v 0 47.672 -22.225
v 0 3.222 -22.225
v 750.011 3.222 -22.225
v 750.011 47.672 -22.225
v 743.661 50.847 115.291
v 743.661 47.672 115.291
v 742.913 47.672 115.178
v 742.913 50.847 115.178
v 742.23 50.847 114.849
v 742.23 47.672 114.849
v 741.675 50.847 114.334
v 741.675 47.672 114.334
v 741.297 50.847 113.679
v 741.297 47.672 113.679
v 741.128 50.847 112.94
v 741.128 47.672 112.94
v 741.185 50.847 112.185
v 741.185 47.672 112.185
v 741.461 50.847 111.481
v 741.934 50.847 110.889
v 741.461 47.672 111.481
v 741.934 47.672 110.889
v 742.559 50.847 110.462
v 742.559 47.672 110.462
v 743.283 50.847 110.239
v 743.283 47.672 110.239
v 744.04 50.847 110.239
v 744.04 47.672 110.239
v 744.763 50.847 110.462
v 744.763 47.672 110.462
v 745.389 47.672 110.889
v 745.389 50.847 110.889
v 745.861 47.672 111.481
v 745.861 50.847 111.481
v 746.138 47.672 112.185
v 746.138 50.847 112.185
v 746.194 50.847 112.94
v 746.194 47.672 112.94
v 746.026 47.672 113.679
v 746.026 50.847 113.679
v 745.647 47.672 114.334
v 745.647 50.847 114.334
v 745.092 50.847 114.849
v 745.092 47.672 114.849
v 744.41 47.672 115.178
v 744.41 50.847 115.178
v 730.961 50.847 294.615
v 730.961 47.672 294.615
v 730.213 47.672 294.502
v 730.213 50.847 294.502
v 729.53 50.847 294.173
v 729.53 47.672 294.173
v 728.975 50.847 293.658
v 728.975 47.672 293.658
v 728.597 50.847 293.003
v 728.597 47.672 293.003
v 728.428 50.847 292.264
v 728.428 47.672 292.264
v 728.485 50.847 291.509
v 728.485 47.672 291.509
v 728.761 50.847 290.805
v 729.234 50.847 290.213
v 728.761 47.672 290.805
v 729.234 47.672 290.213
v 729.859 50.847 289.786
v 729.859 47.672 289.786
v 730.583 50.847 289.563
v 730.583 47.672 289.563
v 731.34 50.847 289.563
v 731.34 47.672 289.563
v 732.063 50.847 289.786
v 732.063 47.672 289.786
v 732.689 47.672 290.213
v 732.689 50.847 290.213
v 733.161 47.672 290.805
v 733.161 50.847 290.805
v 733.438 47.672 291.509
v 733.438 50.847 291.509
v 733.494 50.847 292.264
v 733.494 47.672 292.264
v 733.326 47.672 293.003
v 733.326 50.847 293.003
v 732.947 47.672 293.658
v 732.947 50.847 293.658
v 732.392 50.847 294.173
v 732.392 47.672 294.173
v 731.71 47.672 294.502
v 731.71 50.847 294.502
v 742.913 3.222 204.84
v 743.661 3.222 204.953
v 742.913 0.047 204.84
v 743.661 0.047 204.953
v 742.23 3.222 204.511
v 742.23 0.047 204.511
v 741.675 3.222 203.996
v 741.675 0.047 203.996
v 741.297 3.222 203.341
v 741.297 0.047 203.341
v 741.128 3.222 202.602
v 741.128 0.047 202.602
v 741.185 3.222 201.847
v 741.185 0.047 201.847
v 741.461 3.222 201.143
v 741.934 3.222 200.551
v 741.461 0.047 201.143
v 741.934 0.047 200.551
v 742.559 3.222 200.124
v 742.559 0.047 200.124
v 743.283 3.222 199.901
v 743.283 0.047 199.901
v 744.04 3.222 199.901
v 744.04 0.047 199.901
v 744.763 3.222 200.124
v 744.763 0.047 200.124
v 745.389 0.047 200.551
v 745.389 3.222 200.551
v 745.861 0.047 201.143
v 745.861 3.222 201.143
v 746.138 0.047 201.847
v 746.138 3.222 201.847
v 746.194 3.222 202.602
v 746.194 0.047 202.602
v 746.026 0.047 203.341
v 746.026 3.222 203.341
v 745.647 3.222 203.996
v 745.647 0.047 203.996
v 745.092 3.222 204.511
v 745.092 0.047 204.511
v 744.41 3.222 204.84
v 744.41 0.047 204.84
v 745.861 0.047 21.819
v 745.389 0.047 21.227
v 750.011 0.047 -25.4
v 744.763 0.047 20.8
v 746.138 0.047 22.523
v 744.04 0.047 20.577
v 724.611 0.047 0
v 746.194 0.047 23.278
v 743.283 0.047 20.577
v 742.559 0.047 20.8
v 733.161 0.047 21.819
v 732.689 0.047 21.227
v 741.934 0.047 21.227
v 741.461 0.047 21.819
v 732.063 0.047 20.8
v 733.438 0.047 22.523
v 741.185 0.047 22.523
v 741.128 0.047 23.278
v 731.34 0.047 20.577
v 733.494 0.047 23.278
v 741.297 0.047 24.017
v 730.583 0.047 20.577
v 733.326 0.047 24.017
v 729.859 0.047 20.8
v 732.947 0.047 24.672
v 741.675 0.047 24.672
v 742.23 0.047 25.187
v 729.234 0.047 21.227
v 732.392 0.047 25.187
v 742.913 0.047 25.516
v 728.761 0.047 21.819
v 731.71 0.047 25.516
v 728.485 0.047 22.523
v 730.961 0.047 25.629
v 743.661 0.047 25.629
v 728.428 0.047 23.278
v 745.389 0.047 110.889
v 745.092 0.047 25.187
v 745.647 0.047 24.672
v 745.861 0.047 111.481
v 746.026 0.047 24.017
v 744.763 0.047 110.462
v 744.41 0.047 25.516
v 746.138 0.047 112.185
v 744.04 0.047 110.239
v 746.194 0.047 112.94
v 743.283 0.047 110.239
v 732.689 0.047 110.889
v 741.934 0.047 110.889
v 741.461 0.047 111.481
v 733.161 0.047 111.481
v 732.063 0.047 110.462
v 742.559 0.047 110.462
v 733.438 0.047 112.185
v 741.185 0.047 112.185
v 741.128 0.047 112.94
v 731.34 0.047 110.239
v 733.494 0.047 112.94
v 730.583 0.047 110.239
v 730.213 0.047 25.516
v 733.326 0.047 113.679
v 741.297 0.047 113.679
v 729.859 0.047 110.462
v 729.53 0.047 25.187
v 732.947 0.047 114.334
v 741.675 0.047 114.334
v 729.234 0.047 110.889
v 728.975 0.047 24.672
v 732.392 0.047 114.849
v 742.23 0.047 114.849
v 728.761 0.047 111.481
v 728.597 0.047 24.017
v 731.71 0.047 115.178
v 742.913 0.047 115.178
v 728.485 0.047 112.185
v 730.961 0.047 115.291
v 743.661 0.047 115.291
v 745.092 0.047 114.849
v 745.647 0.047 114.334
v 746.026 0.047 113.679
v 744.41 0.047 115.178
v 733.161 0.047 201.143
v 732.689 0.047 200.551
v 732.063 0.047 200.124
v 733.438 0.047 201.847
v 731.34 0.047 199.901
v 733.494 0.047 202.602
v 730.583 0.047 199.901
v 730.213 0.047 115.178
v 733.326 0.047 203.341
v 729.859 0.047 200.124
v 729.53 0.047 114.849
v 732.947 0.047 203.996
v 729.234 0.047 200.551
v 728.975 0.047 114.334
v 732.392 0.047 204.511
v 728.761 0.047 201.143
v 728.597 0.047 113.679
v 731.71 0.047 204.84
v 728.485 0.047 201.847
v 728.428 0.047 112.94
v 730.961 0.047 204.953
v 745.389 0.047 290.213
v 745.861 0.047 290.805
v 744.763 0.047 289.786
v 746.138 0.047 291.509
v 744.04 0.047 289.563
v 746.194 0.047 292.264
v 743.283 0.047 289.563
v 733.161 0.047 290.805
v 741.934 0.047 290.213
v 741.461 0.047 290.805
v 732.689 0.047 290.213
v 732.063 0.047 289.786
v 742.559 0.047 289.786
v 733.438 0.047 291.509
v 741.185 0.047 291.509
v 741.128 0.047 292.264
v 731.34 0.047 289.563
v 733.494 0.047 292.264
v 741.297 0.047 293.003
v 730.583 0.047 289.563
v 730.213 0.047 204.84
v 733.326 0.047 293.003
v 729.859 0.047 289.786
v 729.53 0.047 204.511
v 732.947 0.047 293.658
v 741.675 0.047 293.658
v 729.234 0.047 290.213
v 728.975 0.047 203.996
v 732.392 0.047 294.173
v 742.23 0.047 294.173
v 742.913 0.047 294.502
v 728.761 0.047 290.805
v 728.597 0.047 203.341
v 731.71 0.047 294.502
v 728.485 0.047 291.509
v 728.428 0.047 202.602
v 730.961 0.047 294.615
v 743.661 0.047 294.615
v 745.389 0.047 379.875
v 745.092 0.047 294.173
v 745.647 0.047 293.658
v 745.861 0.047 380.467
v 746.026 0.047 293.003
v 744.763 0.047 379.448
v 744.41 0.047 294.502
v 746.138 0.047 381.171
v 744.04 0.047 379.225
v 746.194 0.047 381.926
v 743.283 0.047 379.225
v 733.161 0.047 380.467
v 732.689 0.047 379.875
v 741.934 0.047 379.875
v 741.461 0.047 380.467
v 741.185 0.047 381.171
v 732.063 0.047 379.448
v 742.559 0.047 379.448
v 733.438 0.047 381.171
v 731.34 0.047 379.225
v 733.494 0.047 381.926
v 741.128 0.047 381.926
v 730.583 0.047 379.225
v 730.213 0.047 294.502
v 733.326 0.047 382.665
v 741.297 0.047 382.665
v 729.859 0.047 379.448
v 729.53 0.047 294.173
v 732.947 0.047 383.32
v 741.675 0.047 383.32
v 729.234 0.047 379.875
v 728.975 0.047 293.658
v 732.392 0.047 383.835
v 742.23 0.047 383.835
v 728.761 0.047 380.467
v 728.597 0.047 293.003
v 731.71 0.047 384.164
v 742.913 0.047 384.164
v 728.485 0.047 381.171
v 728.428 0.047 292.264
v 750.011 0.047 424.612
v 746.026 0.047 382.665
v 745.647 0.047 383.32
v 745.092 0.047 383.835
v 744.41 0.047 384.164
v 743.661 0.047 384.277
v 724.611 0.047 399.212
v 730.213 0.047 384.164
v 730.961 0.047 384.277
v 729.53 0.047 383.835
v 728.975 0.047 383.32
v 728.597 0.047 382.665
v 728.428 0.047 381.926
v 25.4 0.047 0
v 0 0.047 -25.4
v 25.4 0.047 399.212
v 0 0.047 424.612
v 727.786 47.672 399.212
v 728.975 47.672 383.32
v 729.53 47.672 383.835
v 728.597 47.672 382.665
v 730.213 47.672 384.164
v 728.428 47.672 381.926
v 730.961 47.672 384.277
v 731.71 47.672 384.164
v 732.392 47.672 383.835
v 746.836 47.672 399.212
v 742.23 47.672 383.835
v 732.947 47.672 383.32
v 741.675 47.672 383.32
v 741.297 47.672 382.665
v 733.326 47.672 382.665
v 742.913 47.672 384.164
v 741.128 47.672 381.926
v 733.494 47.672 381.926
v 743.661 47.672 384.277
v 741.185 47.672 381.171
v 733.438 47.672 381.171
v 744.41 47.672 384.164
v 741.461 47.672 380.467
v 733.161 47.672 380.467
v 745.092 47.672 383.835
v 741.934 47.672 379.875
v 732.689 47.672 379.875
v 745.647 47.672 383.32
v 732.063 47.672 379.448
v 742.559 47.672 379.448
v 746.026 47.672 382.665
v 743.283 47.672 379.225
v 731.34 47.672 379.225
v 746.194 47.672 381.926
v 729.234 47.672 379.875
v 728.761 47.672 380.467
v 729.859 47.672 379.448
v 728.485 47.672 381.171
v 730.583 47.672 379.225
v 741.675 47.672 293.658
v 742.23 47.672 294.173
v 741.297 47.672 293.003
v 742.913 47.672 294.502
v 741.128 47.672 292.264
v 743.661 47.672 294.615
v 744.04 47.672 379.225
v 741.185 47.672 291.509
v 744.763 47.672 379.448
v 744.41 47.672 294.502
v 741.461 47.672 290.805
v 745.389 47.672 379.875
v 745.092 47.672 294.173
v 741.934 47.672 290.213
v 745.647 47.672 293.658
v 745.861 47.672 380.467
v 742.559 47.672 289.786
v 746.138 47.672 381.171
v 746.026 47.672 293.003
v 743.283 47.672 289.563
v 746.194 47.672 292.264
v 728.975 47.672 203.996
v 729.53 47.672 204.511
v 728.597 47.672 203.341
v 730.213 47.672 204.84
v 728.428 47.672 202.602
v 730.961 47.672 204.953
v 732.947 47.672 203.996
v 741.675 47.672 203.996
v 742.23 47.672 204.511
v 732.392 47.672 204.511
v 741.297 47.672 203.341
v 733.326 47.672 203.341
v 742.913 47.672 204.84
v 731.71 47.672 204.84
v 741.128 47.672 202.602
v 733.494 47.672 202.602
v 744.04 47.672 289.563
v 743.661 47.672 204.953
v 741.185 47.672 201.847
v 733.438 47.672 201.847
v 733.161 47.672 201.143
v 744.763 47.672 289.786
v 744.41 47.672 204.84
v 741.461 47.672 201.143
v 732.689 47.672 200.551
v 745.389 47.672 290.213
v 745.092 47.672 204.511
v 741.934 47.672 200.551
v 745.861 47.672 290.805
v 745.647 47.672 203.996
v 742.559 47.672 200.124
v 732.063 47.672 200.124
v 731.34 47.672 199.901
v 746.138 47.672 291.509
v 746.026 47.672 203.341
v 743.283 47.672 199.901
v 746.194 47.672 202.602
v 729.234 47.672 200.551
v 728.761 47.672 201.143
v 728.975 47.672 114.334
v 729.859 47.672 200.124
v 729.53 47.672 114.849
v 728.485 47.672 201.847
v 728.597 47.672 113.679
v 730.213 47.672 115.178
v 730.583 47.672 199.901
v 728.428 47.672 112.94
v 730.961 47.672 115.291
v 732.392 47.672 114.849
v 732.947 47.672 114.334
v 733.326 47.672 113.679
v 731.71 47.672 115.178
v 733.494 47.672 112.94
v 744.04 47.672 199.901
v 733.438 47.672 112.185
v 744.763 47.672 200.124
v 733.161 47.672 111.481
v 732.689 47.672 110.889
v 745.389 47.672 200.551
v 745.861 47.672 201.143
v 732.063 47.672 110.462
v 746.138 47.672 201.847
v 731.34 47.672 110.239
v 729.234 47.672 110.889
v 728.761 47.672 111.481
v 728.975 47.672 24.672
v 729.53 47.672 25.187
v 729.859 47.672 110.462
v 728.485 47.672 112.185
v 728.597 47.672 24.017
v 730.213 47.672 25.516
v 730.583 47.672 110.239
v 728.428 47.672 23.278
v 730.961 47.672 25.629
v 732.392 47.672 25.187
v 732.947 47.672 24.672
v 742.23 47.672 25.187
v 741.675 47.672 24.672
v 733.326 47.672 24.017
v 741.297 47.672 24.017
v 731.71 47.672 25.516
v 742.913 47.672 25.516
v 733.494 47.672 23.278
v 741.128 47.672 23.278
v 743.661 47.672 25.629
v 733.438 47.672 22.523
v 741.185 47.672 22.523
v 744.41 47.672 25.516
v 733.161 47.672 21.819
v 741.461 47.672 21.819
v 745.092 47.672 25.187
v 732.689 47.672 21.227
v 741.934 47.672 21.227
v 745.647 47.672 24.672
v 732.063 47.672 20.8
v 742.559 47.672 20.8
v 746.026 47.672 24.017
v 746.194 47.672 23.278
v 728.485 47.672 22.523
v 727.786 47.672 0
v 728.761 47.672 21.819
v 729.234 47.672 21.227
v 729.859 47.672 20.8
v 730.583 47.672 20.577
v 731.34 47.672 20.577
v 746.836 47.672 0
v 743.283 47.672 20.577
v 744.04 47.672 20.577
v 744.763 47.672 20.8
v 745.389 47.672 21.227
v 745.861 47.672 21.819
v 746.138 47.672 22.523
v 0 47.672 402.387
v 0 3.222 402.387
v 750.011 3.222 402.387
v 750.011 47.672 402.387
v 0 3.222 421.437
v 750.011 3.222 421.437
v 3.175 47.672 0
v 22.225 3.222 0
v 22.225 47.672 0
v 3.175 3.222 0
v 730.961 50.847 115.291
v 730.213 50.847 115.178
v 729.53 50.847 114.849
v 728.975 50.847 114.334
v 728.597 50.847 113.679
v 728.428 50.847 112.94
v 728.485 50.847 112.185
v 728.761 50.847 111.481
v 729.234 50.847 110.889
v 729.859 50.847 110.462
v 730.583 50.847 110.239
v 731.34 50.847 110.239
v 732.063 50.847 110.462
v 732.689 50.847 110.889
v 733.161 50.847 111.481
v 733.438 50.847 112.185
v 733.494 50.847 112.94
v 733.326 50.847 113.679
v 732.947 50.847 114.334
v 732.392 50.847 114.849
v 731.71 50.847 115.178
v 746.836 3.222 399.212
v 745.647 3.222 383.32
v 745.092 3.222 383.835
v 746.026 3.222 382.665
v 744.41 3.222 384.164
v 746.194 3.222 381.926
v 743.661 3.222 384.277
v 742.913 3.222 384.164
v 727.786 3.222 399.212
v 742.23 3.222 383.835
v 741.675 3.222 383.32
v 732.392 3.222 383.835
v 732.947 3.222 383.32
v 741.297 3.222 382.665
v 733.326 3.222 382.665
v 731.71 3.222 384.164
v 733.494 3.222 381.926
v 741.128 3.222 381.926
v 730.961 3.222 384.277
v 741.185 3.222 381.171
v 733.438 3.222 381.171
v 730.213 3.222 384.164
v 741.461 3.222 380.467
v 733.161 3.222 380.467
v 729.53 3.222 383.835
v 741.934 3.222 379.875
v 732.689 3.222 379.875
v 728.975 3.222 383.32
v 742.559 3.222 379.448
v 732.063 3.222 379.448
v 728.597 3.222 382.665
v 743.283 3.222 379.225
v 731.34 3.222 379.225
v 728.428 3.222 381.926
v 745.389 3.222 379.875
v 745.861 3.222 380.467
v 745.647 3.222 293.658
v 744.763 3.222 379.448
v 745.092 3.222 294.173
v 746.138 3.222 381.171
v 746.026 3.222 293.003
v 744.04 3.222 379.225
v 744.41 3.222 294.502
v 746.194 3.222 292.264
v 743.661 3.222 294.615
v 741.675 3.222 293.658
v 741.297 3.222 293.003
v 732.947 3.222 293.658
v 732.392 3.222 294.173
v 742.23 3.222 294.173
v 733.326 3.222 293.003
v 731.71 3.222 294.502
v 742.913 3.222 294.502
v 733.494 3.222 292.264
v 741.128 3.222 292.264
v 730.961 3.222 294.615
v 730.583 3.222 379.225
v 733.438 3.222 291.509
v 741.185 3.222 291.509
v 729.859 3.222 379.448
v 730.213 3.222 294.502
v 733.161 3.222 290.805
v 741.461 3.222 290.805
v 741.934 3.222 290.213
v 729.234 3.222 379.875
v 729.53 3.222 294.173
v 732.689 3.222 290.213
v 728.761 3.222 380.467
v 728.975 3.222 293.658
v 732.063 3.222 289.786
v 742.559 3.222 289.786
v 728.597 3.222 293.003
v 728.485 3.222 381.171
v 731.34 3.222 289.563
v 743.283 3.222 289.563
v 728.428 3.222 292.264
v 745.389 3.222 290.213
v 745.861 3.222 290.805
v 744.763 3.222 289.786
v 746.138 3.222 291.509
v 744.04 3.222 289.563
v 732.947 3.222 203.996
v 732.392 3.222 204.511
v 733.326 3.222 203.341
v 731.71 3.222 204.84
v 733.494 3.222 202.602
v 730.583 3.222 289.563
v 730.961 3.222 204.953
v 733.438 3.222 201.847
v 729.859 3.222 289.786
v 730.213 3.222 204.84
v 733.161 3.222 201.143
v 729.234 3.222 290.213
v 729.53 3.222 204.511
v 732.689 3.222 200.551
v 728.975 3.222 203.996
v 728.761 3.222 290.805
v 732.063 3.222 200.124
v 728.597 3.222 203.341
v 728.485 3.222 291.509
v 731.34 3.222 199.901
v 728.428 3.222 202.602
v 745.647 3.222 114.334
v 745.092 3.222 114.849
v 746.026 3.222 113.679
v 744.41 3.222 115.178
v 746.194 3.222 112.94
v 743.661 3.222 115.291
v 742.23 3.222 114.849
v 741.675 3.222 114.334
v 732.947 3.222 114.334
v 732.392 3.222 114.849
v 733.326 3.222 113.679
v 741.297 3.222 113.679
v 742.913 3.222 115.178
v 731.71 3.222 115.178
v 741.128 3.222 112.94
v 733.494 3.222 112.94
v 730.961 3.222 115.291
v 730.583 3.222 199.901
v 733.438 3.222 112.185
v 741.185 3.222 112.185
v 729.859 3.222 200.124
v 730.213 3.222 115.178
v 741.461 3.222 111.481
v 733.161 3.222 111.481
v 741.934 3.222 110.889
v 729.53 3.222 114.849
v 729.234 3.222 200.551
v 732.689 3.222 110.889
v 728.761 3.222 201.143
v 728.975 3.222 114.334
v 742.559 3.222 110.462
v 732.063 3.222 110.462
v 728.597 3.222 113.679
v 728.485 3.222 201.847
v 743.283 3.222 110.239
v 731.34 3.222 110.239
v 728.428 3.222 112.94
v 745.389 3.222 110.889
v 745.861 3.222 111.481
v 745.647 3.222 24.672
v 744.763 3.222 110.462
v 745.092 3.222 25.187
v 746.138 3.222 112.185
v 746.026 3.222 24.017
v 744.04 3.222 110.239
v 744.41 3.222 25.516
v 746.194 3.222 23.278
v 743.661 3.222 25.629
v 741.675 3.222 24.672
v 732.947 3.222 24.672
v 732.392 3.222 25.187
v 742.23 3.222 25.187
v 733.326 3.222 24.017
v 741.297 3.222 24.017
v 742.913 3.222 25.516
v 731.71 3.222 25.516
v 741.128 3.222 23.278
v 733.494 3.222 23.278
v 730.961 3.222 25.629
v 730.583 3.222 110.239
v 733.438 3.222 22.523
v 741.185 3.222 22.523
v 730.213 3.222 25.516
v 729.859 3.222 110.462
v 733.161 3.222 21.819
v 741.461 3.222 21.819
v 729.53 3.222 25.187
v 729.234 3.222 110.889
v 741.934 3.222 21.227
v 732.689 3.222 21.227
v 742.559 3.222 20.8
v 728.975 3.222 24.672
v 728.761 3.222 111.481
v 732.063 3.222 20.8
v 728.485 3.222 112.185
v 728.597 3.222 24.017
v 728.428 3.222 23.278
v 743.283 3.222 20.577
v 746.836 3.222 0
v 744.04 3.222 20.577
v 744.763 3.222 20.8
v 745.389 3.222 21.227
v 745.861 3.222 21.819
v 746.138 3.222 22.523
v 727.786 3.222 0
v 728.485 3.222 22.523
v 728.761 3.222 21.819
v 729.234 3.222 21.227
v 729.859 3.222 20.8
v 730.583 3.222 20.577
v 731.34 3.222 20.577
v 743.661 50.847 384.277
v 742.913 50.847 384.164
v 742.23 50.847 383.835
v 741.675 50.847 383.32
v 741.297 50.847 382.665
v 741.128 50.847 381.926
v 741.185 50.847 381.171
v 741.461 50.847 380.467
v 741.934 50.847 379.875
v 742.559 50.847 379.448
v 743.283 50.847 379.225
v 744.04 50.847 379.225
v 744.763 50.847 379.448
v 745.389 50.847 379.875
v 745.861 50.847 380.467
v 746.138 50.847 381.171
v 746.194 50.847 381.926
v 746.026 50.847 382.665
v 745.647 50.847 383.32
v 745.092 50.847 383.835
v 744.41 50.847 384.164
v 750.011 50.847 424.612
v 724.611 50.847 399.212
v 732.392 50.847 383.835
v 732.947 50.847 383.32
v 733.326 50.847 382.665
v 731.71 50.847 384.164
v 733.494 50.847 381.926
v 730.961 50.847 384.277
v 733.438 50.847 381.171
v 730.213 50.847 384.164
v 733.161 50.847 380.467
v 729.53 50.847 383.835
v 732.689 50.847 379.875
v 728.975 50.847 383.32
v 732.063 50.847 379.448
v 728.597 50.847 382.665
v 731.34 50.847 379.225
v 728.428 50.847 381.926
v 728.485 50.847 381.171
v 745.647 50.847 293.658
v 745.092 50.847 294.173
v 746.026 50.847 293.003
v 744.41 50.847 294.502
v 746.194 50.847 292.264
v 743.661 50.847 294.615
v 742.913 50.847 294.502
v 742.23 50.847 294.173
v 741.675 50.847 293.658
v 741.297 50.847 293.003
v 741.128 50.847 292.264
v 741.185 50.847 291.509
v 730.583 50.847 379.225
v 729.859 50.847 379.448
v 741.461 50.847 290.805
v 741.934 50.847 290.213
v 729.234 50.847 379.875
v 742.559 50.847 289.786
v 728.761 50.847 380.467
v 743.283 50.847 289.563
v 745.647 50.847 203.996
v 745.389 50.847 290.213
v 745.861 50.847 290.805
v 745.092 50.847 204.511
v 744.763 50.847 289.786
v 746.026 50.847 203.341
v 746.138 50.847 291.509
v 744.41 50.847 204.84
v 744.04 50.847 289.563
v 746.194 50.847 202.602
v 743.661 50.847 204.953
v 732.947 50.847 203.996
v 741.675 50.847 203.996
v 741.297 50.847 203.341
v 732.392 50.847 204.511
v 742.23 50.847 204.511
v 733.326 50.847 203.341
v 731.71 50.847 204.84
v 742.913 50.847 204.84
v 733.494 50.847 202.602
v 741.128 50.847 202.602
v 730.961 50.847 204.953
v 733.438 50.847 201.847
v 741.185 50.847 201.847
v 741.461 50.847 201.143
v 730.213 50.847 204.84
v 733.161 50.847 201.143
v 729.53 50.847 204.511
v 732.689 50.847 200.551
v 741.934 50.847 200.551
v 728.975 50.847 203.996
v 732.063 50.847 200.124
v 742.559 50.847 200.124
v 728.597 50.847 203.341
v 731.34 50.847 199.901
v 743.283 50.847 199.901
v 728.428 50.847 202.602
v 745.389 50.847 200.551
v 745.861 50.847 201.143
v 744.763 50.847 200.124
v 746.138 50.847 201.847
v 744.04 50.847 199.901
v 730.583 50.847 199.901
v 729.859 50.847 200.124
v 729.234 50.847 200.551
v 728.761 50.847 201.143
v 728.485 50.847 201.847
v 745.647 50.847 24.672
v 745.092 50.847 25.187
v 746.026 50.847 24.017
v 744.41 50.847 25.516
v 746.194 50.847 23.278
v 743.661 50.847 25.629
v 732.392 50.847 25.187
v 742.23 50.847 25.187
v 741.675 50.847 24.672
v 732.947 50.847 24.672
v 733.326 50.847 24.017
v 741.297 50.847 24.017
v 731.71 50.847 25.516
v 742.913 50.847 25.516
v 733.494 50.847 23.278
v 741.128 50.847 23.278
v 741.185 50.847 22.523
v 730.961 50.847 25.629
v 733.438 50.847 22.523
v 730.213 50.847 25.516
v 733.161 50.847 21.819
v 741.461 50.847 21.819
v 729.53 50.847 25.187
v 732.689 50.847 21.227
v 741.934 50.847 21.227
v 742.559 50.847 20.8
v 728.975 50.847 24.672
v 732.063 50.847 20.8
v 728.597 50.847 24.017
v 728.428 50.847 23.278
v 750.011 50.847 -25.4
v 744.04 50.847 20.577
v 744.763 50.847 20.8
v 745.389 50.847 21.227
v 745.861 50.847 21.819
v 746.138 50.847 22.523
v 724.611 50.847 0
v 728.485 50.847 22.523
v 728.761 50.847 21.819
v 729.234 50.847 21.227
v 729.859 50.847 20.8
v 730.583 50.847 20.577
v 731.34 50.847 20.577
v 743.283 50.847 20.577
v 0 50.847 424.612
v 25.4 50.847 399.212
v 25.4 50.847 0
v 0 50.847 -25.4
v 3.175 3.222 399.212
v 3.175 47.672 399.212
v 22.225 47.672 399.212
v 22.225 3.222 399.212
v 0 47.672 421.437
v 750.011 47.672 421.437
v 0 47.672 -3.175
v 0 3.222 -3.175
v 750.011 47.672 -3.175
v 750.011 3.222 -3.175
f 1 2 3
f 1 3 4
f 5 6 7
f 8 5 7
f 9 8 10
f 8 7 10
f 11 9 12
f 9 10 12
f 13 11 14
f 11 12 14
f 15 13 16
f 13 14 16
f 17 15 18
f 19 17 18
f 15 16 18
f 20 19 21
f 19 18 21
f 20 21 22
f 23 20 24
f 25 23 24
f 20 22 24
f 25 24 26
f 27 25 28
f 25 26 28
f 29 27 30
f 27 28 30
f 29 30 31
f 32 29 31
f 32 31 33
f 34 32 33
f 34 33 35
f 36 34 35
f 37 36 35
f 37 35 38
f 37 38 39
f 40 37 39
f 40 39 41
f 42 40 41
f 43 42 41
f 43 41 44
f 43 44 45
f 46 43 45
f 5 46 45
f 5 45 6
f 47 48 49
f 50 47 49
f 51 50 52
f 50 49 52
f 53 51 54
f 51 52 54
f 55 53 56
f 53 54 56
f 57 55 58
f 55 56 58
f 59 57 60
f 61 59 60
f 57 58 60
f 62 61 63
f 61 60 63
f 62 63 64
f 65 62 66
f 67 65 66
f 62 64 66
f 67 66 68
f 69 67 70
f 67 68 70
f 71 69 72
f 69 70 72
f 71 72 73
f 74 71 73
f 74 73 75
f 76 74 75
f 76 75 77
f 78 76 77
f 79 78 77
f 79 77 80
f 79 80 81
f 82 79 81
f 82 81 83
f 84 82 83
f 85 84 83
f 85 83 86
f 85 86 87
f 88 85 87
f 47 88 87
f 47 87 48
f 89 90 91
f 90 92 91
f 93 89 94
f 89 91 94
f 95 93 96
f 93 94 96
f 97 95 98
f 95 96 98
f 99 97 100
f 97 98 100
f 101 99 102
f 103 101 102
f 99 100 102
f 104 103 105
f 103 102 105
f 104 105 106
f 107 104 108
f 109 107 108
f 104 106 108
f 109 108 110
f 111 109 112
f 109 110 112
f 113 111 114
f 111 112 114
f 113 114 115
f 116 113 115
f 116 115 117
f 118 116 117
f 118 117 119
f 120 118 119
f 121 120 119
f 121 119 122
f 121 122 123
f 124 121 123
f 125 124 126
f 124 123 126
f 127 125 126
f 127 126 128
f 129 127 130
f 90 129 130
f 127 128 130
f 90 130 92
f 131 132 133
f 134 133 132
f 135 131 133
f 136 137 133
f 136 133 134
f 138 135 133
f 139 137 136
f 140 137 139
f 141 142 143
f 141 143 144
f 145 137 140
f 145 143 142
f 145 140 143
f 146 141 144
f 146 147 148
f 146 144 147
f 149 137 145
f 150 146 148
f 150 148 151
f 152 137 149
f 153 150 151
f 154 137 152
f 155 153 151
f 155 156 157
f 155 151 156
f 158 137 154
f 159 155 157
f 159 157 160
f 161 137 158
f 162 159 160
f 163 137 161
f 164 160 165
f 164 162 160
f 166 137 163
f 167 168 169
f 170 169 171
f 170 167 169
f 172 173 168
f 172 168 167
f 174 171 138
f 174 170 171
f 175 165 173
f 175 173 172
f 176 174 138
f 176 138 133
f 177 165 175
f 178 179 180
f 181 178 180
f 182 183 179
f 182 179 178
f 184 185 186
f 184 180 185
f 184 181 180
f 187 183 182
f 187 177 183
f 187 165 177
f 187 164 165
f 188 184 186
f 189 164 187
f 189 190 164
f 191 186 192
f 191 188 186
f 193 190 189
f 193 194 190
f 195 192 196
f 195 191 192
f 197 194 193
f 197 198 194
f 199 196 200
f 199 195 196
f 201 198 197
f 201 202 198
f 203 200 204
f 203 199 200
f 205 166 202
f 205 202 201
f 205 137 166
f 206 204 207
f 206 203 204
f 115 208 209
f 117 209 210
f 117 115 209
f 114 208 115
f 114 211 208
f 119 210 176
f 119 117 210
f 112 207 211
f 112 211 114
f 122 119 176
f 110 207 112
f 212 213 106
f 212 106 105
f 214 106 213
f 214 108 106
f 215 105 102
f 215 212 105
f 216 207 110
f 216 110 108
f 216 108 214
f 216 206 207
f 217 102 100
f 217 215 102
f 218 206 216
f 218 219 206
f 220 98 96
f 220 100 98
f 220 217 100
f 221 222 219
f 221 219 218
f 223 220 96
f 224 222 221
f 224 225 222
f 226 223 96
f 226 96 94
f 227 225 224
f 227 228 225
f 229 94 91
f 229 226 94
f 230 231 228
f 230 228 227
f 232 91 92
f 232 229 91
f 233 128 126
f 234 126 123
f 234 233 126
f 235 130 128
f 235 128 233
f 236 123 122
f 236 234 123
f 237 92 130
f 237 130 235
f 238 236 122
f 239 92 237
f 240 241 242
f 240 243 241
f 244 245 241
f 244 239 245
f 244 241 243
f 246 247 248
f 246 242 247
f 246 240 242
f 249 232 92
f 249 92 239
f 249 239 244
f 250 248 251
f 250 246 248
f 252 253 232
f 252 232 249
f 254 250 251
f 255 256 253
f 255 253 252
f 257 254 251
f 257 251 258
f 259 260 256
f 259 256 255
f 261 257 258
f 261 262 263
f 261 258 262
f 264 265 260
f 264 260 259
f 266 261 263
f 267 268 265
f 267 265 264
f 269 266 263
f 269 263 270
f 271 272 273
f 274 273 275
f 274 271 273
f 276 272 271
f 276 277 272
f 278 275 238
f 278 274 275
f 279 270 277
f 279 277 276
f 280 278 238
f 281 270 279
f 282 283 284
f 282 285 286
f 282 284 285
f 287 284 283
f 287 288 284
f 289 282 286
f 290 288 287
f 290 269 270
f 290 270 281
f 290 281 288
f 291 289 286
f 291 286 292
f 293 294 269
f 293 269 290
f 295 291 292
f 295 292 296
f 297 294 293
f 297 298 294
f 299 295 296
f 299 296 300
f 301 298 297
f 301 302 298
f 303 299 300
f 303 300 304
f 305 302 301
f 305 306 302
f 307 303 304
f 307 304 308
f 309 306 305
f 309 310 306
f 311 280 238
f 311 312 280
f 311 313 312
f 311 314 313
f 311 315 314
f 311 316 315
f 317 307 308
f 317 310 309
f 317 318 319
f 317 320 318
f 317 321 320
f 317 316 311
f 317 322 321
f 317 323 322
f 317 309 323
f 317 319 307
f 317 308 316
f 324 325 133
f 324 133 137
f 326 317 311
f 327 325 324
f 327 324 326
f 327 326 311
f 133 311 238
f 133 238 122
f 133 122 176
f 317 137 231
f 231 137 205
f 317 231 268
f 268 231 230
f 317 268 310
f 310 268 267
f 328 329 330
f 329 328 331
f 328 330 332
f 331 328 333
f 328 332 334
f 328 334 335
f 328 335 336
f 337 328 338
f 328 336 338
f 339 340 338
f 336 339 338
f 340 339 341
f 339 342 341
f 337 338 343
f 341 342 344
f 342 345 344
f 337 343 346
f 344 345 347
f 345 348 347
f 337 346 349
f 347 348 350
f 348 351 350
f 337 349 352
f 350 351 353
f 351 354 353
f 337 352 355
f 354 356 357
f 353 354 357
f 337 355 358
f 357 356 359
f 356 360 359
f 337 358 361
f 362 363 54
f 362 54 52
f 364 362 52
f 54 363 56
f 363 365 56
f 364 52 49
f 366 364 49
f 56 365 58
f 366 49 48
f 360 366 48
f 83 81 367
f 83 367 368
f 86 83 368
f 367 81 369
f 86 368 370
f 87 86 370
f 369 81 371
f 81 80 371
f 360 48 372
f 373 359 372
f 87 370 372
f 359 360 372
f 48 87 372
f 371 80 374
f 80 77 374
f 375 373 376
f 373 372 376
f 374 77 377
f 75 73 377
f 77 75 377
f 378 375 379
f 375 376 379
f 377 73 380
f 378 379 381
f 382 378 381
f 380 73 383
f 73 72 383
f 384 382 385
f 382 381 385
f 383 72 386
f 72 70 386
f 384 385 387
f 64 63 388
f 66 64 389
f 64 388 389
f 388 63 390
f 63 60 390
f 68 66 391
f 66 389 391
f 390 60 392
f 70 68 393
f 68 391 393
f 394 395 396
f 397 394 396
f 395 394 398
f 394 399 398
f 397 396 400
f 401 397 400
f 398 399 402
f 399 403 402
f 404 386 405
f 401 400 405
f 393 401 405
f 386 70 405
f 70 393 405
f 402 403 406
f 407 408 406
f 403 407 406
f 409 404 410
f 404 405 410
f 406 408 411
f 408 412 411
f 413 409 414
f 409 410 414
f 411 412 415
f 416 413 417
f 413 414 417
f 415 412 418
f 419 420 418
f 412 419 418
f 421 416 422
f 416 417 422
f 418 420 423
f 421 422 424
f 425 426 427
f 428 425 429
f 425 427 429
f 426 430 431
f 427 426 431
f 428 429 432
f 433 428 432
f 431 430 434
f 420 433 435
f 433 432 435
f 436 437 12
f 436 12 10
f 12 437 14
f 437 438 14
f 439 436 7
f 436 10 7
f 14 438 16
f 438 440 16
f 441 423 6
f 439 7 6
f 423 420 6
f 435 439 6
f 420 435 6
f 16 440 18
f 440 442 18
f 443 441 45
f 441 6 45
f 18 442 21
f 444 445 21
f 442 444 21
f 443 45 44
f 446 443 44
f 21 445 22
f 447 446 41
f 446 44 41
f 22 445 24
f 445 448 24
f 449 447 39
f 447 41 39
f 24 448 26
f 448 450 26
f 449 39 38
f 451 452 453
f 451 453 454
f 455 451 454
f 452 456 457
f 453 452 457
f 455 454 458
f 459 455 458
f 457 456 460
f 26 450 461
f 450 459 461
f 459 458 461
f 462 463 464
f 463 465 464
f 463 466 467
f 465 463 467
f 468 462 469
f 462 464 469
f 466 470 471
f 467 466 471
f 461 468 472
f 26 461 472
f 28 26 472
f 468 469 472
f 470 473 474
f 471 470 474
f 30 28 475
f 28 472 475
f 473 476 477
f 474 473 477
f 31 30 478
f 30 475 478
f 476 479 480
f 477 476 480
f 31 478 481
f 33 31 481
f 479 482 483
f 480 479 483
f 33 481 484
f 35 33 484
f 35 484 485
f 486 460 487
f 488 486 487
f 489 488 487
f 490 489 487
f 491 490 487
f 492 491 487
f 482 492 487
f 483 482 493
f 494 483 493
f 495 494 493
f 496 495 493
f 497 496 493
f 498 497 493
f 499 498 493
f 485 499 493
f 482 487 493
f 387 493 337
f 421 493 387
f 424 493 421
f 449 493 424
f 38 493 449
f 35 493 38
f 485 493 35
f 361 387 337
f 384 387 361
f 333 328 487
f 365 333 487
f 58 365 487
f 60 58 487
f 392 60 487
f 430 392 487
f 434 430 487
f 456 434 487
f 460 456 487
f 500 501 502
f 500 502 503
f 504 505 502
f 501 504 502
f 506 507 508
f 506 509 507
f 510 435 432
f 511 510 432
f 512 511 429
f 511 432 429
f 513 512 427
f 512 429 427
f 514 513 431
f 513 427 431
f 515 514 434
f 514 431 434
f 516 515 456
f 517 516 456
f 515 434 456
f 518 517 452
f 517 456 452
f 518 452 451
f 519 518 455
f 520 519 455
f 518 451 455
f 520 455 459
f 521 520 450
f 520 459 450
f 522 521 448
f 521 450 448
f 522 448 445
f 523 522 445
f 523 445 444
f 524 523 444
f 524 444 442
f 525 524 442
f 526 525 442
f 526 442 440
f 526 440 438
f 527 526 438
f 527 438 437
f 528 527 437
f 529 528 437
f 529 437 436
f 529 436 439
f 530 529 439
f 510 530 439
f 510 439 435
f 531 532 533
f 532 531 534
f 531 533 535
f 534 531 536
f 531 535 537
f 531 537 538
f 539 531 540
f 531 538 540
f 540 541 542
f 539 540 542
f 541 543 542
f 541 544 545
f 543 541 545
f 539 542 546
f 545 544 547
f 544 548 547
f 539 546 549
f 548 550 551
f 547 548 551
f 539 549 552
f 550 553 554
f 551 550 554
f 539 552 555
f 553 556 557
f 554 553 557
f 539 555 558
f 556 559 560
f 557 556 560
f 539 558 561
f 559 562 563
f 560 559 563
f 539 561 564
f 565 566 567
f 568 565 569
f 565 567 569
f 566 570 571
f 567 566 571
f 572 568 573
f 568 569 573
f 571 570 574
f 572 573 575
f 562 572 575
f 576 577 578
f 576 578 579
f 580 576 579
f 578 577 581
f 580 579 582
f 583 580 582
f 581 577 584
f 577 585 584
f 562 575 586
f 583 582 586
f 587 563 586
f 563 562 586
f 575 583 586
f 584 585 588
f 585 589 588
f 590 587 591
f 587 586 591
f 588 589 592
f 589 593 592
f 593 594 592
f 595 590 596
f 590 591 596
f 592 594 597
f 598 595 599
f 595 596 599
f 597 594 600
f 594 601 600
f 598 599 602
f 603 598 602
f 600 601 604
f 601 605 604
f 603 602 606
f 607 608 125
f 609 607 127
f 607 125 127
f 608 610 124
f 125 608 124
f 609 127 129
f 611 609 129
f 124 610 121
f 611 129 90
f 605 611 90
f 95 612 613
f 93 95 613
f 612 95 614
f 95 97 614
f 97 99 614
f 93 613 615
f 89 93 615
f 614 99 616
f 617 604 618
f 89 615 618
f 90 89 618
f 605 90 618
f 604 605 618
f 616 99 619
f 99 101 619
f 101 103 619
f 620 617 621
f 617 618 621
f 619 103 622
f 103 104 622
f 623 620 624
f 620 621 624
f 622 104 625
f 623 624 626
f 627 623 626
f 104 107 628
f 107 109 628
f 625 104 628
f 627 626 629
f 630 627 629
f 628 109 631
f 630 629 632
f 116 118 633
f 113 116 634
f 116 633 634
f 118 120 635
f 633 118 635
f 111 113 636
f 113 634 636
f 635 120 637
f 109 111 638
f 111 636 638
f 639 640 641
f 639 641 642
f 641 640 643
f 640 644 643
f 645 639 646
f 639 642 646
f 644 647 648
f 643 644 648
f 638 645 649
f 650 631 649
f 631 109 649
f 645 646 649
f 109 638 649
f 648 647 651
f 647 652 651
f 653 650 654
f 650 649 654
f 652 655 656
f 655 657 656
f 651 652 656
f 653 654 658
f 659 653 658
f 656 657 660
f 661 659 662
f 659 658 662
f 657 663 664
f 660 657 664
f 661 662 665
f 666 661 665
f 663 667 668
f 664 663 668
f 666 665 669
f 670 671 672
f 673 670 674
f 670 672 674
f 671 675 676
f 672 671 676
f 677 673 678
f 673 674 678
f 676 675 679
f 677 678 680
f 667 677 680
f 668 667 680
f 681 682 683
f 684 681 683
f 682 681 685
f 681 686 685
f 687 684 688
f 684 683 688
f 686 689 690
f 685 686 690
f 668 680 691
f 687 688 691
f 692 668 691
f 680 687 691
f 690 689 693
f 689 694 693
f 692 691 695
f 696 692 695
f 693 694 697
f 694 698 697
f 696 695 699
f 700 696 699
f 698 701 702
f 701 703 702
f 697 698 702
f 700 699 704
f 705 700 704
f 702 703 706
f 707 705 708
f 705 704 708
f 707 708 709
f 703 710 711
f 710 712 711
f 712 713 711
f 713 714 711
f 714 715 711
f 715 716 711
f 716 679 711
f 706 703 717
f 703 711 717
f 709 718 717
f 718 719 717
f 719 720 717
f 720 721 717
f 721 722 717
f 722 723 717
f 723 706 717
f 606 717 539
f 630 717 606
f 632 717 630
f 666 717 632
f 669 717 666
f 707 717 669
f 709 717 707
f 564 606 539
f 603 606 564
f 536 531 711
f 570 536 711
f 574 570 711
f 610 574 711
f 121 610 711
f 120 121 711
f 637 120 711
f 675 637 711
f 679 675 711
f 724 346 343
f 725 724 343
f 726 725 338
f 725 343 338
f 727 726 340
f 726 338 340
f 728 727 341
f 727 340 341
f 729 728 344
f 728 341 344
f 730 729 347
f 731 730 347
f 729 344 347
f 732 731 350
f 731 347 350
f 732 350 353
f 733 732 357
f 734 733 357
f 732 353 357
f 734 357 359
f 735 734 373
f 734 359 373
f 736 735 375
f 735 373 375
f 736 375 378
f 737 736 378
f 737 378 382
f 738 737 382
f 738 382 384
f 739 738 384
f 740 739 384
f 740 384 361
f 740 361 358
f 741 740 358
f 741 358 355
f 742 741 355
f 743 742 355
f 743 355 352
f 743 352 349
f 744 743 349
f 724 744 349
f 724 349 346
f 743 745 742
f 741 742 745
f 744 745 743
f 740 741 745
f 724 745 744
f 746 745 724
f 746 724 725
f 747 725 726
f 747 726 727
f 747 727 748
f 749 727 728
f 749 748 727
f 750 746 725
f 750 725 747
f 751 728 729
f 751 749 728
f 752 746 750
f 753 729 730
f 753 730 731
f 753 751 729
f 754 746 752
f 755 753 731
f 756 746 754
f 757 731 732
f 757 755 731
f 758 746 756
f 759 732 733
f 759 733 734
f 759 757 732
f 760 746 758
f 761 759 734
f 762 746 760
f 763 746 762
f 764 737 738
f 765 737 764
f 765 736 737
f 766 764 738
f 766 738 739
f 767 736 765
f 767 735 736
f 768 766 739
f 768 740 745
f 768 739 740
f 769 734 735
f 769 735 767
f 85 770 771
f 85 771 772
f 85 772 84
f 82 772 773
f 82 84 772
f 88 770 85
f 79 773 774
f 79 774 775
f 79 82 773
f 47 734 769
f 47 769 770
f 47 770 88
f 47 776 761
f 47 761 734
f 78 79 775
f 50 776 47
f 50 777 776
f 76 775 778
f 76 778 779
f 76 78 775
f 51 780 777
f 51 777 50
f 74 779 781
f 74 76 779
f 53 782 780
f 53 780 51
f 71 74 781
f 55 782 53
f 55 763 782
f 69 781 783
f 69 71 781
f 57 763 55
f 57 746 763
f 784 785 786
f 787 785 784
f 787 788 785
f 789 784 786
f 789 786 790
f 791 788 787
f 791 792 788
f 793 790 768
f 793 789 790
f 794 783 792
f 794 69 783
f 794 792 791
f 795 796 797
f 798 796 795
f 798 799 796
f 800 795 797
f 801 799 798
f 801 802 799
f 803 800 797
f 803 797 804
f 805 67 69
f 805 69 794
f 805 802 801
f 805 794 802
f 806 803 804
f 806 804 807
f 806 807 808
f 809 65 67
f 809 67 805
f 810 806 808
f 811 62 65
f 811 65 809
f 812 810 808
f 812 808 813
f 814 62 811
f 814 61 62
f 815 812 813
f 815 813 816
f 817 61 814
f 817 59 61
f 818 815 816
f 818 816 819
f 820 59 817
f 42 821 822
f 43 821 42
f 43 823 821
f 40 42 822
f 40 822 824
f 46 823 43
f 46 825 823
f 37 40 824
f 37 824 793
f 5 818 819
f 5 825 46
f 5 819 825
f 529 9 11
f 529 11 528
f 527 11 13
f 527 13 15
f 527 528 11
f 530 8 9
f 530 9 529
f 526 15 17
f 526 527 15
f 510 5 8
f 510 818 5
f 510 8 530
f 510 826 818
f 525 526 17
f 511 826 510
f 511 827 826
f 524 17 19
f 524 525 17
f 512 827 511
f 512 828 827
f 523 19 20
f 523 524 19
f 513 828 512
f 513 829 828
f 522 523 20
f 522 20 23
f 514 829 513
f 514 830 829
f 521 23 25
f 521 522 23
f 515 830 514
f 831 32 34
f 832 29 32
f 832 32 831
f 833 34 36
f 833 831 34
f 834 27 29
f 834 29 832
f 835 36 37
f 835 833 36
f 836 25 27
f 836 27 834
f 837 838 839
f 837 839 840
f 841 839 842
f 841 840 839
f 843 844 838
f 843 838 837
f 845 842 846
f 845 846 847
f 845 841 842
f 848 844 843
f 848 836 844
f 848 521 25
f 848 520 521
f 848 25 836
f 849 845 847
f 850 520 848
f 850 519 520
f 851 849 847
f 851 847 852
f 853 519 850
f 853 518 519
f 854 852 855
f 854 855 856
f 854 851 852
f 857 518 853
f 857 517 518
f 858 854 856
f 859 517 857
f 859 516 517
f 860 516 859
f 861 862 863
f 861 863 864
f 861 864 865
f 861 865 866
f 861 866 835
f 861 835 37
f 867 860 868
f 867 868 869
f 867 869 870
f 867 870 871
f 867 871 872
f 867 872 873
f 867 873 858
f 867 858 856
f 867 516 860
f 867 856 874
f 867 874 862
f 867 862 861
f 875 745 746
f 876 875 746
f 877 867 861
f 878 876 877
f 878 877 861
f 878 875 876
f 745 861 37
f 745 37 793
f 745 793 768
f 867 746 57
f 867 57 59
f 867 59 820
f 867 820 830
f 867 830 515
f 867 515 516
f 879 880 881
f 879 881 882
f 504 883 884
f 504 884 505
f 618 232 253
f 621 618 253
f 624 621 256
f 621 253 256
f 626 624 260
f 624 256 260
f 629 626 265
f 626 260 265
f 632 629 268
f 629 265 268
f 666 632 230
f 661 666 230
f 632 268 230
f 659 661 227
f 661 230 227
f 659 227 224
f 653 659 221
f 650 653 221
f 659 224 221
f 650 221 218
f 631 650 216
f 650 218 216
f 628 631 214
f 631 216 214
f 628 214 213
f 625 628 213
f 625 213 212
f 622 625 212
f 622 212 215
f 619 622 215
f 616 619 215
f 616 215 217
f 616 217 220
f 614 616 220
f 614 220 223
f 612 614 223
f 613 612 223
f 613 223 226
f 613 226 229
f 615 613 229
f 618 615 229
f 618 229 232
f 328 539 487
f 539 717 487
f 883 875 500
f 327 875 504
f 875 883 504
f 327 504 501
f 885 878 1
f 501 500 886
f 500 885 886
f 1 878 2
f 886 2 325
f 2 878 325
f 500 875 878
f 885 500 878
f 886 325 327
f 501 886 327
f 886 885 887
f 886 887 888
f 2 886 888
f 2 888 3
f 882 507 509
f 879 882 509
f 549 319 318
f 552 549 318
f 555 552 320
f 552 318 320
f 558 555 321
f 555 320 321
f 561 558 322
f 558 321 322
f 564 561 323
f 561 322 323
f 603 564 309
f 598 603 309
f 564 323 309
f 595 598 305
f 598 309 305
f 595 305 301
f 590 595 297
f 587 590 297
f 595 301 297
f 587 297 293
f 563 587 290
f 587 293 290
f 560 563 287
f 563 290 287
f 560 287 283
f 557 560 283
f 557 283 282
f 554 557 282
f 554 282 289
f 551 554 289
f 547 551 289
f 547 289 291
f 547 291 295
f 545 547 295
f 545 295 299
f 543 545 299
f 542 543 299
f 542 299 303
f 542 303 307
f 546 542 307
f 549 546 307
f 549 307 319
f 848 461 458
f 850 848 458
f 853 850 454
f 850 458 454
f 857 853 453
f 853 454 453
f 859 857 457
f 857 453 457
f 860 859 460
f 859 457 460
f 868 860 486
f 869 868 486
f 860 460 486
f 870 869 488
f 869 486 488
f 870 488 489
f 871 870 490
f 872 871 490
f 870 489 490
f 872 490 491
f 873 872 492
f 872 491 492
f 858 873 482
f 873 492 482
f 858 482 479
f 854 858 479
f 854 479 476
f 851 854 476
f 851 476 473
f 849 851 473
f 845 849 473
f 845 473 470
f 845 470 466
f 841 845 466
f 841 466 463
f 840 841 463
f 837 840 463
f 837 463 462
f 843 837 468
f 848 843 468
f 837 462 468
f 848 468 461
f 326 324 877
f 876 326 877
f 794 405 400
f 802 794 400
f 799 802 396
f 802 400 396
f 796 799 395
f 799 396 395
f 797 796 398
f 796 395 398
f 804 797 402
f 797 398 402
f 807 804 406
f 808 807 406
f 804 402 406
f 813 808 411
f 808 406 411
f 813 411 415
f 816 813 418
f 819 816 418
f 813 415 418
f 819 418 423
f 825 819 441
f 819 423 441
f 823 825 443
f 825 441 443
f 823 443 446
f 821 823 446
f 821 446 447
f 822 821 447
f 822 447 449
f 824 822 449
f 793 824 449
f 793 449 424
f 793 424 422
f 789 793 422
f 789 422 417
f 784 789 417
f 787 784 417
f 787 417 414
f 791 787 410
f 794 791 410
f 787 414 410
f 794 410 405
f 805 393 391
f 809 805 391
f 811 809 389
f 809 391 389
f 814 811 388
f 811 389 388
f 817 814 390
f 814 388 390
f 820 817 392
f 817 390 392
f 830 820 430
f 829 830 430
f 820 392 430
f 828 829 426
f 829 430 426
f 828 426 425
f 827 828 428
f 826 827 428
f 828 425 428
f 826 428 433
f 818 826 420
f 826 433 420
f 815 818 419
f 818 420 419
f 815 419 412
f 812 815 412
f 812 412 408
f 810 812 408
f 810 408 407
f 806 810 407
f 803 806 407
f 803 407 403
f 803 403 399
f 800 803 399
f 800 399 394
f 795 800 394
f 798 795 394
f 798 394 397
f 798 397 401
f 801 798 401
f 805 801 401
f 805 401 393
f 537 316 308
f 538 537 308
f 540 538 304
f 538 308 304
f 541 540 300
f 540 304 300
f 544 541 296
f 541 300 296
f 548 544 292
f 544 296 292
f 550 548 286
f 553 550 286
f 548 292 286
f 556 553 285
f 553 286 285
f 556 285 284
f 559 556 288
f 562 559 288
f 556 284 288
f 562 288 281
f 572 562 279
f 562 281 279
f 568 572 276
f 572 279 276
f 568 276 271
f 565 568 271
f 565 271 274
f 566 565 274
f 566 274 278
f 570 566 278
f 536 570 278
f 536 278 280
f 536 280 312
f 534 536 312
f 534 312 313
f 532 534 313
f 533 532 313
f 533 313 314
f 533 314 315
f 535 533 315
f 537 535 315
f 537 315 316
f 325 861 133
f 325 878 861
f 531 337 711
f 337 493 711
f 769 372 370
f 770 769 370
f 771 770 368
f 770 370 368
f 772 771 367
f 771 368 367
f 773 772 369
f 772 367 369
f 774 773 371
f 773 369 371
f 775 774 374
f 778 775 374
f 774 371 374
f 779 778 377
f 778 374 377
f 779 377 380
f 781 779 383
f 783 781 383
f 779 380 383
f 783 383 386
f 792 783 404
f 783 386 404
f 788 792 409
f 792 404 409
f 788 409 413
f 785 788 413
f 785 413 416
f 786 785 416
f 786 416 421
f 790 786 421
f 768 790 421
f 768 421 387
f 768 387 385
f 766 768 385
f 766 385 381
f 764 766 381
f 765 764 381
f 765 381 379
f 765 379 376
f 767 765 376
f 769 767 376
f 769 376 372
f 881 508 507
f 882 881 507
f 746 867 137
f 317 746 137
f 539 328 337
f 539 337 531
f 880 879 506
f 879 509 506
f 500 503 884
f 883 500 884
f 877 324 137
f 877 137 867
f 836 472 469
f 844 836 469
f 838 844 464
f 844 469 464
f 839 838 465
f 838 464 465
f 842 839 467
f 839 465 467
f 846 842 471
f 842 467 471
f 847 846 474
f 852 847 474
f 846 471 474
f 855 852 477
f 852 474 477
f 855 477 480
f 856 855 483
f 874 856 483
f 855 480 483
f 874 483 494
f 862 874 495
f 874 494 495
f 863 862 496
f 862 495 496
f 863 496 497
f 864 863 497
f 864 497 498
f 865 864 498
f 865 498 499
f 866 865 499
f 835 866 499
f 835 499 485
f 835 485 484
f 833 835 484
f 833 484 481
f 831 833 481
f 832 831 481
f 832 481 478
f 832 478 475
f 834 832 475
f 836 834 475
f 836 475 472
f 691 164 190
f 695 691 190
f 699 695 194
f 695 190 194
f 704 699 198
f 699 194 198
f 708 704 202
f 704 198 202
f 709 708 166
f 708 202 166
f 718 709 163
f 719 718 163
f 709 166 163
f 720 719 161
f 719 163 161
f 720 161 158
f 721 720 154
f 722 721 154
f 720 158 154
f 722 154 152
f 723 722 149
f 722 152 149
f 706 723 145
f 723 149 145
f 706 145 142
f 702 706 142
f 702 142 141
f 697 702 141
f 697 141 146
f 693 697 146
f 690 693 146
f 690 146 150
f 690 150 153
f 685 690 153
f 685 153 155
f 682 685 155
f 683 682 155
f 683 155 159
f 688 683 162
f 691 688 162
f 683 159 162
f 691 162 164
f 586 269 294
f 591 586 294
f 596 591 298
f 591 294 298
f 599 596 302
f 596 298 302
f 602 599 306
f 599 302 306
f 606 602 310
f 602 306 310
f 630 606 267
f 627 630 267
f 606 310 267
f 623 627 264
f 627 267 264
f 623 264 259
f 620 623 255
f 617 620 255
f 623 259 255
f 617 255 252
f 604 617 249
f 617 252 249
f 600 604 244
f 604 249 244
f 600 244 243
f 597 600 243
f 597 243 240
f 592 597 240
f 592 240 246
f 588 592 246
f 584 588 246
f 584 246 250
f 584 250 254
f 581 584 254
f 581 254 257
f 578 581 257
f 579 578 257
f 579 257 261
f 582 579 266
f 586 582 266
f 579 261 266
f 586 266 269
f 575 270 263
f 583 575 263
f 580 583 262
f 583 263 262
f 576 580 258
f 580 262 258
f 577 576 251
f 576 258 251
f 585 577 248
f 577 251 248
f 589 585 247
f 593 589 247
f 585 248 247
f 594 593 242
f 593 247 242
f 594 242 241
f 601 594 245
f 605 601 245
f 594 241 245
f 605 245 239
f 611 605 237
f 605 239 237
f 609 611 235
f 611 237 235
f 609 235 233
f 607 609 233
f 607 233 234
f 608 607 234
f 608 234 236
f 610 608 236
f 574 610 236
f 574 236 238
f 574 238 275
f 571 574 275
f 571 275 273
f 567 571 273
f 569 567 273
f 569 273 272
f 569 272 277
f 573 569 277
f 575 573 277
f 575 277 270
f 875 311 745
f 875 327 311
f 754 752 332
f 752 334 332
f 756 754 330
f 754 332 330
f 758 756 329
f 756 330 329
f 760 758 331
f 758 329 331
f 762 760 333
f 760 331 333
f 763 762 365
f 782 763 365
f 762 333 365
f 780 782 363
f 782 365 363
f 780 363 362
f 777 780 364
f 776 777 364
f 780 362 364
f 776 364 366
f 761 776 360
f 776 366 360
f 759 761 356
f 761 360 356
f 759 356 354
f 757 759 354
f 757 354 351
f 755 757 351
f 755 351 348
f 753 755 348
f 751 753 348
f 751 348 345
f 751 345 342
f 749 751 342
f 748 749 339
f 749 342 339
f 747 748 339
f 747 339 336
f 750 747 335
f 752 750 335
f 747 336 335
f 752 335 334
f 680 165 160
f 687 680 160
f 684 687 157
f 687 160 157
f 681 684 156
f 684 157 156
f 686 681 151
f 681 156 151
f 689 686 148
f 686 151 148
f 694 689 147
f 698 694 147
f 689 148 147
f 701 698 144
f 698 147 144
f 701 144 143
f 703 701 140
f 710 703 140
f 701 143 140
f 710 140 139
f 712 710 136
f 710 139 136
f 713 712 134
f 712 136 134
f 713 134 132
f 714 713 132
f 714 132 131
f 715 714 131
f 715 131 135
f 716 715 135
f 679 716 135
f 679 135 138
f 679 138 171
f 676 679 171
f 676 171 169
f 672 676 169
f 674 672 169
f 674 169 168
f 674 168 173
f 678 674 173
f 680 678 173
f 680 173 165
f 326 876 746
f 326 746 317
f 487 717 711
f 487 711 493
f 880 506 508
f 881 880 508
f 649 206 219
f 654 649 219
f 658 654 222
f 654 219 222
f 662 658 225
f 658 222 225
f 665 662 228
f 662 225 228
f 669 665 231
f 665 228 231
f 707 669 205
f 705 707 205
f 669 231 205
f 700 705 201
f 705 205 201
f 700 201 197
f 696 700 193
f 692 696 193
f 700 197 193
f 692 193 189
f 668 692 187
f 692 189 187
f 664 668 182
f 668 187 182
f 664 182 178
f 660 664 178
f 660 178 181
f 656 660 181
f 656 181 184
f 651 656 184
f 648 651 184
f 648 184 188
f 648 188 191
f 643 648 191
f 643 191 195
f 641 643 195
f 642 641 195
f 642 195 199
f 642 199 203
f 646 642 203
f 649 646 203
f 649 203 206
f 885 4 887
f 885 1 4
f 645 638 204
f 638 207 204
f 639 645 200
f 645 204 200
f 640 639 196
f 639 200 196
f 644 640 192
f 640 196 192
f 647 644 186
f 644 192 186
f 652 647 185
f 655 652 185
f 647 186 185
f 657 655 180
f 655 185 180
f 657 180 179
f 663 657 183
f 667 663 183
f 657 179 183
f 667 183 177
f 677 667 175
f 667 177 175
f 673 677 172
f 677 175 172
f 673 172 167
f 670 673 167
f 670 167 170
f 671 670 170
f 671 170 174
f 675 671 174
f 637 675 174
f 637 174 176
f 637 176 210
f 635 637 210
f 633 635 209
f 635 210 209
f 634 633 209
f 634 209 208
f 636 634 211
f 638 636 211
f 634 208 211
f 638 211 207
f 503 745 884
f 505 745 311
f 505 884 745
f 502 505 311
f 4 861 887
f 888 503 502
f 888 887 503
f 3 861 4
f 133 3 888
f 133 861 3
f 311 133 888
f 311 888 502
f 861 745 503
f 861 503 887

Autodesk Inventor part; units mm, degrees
ref_plane "YZ Plane" through (0, 0, 0) normal (1, 0, 0) x (0, 1, 0)
ref_plane "XZ Plane" through (0, 0, 0) normal (0, 1, 0) x (-1, 0, 0)
ref_plane "XY Plane" through (0, 0, 0) normal (0, 0, 1) x (1, 0, 0)
sketch "Sketch1" plane through (0, 0, 0) normal (1, 0, 0) x (0, 1, 0)
  line L0 (0.0473, 0) -> (50.8473, 0)
  line L1 (50.8473, 0) -> (50.8473, -25.4)
  line L2 (50.8473, -25.4) -> (0.0473, -25.4)
  line L3 (0.0473, -25.4) -> (0.0473, 0)
  line L4 (47.6723, -3.175) -> (3.2223, -3.175)
  line L5 (3.2223, -3.175) -> (3.2223, -22.225)
  line L6 (3.2223, -22.225) -> (47.6723, -22.225)
  line L7 (47.6723, -22.225) -> (47.6723, -3.175)
  dimension "d0" = 25.4
  dimension "d1" = 3.175
  dimension "d2" = 3.175
  dimension "d3" = 3.175
  dimension "d4" = 3.175
  dimension "d5" = 44.45
extrude "Extrusion1" add sketch "Sketch1" along normal blind 750.0112
sketch "Sketch2" plane through (0, 0.0473, 0) normal (0, 0, 1) x (1, 0, 0)
  line L0 (0, 0) -> (0, 50.8) projected
  line L1 (0, 0) -> (750.0112, 0) projected
  line L2 (0, 50.8) -> (750.0112, 50.8) projected
  line L3 (0, 0) -> (25.4, 0)
  line L4 (25.4, 0) -> (25.4, 50.8)
  line L5 (25.4, 50.8) -> (0, 50.8)
  line L6 (0, 50.8) -> (0, 0)
  line L7 (3.175, 47.625) -> (22.225, 47.625)
  line L8 (22.225, 47.625) -> (22.225, 3.175)
  line L9 (22.225, 3.175) -> (3.175, 3.175)
  line L10 (3.175, 3.175) -> (3.175, 47.625)
  dimension "d8" = 25.4
  dimension "d9" = 50.8
  dimension "d10" = 3.175
  dimension "d11" = 3.175
  dimension "d12" = 3.175
  dimension "d13" = 3.175
extrude "Extrusion2" add sketch "Sketch2" along normal blind 399.2118
ref_plane "Work Plane1" through (375.0056, 0, 0) normal (1, 0, 0) x (0, 0, -1)
mirror "Mirror1" about plane through (375.0056, 0, 0) normal (1, 0, 0) of "Extrusion2"
ref_plane "Work Plane2" through (25.4, 0.0473, 199.6059) normal (0, 0, 1) x (1, 0, 0)
mirror "Mirror2" about plane through (25.4, 0.0473, 199.6059) normal (0, 0, 1) of "Extrusion1"
ref_plane "Work Plane3" through (0, 0.0473, -25.4) normal (0, 0, -1) x (-1, 0, 0)
ref_plane "Work Plane4" through (750.0112, 0, 0) normal (1, 0, 0) x (0, 0, -1)
sketch "Sketch5" plane through (0, 50.8473, -25.4) normal (0, 1, 0) x (1, 0, 0)
  line L0 (0, 0) -> (750.0112, 0) projected
  line L1 (724.6112, -25.4) -> (724.6112, -424.6118) projected
  point P0 (0, -25.4)
  point P1 (730.9612, -48.4886)
  dimension "d23" = 48.4886
  dimension "d24" = 6.35
hole "Hole1" at (730.9612, 50.8473, 23.0886) direction (0, -1, 0) diameter 5.08 end through all
pattern_linear "Rectangular Pattern1" count 2 spacing 12.7 along (1, 0, 0) count 5 spacing 89.662 along (0, 0, 1) of "Hole1"
properties part number "Resized frame" material "Stainless Steel AISI 440C, Welded"
